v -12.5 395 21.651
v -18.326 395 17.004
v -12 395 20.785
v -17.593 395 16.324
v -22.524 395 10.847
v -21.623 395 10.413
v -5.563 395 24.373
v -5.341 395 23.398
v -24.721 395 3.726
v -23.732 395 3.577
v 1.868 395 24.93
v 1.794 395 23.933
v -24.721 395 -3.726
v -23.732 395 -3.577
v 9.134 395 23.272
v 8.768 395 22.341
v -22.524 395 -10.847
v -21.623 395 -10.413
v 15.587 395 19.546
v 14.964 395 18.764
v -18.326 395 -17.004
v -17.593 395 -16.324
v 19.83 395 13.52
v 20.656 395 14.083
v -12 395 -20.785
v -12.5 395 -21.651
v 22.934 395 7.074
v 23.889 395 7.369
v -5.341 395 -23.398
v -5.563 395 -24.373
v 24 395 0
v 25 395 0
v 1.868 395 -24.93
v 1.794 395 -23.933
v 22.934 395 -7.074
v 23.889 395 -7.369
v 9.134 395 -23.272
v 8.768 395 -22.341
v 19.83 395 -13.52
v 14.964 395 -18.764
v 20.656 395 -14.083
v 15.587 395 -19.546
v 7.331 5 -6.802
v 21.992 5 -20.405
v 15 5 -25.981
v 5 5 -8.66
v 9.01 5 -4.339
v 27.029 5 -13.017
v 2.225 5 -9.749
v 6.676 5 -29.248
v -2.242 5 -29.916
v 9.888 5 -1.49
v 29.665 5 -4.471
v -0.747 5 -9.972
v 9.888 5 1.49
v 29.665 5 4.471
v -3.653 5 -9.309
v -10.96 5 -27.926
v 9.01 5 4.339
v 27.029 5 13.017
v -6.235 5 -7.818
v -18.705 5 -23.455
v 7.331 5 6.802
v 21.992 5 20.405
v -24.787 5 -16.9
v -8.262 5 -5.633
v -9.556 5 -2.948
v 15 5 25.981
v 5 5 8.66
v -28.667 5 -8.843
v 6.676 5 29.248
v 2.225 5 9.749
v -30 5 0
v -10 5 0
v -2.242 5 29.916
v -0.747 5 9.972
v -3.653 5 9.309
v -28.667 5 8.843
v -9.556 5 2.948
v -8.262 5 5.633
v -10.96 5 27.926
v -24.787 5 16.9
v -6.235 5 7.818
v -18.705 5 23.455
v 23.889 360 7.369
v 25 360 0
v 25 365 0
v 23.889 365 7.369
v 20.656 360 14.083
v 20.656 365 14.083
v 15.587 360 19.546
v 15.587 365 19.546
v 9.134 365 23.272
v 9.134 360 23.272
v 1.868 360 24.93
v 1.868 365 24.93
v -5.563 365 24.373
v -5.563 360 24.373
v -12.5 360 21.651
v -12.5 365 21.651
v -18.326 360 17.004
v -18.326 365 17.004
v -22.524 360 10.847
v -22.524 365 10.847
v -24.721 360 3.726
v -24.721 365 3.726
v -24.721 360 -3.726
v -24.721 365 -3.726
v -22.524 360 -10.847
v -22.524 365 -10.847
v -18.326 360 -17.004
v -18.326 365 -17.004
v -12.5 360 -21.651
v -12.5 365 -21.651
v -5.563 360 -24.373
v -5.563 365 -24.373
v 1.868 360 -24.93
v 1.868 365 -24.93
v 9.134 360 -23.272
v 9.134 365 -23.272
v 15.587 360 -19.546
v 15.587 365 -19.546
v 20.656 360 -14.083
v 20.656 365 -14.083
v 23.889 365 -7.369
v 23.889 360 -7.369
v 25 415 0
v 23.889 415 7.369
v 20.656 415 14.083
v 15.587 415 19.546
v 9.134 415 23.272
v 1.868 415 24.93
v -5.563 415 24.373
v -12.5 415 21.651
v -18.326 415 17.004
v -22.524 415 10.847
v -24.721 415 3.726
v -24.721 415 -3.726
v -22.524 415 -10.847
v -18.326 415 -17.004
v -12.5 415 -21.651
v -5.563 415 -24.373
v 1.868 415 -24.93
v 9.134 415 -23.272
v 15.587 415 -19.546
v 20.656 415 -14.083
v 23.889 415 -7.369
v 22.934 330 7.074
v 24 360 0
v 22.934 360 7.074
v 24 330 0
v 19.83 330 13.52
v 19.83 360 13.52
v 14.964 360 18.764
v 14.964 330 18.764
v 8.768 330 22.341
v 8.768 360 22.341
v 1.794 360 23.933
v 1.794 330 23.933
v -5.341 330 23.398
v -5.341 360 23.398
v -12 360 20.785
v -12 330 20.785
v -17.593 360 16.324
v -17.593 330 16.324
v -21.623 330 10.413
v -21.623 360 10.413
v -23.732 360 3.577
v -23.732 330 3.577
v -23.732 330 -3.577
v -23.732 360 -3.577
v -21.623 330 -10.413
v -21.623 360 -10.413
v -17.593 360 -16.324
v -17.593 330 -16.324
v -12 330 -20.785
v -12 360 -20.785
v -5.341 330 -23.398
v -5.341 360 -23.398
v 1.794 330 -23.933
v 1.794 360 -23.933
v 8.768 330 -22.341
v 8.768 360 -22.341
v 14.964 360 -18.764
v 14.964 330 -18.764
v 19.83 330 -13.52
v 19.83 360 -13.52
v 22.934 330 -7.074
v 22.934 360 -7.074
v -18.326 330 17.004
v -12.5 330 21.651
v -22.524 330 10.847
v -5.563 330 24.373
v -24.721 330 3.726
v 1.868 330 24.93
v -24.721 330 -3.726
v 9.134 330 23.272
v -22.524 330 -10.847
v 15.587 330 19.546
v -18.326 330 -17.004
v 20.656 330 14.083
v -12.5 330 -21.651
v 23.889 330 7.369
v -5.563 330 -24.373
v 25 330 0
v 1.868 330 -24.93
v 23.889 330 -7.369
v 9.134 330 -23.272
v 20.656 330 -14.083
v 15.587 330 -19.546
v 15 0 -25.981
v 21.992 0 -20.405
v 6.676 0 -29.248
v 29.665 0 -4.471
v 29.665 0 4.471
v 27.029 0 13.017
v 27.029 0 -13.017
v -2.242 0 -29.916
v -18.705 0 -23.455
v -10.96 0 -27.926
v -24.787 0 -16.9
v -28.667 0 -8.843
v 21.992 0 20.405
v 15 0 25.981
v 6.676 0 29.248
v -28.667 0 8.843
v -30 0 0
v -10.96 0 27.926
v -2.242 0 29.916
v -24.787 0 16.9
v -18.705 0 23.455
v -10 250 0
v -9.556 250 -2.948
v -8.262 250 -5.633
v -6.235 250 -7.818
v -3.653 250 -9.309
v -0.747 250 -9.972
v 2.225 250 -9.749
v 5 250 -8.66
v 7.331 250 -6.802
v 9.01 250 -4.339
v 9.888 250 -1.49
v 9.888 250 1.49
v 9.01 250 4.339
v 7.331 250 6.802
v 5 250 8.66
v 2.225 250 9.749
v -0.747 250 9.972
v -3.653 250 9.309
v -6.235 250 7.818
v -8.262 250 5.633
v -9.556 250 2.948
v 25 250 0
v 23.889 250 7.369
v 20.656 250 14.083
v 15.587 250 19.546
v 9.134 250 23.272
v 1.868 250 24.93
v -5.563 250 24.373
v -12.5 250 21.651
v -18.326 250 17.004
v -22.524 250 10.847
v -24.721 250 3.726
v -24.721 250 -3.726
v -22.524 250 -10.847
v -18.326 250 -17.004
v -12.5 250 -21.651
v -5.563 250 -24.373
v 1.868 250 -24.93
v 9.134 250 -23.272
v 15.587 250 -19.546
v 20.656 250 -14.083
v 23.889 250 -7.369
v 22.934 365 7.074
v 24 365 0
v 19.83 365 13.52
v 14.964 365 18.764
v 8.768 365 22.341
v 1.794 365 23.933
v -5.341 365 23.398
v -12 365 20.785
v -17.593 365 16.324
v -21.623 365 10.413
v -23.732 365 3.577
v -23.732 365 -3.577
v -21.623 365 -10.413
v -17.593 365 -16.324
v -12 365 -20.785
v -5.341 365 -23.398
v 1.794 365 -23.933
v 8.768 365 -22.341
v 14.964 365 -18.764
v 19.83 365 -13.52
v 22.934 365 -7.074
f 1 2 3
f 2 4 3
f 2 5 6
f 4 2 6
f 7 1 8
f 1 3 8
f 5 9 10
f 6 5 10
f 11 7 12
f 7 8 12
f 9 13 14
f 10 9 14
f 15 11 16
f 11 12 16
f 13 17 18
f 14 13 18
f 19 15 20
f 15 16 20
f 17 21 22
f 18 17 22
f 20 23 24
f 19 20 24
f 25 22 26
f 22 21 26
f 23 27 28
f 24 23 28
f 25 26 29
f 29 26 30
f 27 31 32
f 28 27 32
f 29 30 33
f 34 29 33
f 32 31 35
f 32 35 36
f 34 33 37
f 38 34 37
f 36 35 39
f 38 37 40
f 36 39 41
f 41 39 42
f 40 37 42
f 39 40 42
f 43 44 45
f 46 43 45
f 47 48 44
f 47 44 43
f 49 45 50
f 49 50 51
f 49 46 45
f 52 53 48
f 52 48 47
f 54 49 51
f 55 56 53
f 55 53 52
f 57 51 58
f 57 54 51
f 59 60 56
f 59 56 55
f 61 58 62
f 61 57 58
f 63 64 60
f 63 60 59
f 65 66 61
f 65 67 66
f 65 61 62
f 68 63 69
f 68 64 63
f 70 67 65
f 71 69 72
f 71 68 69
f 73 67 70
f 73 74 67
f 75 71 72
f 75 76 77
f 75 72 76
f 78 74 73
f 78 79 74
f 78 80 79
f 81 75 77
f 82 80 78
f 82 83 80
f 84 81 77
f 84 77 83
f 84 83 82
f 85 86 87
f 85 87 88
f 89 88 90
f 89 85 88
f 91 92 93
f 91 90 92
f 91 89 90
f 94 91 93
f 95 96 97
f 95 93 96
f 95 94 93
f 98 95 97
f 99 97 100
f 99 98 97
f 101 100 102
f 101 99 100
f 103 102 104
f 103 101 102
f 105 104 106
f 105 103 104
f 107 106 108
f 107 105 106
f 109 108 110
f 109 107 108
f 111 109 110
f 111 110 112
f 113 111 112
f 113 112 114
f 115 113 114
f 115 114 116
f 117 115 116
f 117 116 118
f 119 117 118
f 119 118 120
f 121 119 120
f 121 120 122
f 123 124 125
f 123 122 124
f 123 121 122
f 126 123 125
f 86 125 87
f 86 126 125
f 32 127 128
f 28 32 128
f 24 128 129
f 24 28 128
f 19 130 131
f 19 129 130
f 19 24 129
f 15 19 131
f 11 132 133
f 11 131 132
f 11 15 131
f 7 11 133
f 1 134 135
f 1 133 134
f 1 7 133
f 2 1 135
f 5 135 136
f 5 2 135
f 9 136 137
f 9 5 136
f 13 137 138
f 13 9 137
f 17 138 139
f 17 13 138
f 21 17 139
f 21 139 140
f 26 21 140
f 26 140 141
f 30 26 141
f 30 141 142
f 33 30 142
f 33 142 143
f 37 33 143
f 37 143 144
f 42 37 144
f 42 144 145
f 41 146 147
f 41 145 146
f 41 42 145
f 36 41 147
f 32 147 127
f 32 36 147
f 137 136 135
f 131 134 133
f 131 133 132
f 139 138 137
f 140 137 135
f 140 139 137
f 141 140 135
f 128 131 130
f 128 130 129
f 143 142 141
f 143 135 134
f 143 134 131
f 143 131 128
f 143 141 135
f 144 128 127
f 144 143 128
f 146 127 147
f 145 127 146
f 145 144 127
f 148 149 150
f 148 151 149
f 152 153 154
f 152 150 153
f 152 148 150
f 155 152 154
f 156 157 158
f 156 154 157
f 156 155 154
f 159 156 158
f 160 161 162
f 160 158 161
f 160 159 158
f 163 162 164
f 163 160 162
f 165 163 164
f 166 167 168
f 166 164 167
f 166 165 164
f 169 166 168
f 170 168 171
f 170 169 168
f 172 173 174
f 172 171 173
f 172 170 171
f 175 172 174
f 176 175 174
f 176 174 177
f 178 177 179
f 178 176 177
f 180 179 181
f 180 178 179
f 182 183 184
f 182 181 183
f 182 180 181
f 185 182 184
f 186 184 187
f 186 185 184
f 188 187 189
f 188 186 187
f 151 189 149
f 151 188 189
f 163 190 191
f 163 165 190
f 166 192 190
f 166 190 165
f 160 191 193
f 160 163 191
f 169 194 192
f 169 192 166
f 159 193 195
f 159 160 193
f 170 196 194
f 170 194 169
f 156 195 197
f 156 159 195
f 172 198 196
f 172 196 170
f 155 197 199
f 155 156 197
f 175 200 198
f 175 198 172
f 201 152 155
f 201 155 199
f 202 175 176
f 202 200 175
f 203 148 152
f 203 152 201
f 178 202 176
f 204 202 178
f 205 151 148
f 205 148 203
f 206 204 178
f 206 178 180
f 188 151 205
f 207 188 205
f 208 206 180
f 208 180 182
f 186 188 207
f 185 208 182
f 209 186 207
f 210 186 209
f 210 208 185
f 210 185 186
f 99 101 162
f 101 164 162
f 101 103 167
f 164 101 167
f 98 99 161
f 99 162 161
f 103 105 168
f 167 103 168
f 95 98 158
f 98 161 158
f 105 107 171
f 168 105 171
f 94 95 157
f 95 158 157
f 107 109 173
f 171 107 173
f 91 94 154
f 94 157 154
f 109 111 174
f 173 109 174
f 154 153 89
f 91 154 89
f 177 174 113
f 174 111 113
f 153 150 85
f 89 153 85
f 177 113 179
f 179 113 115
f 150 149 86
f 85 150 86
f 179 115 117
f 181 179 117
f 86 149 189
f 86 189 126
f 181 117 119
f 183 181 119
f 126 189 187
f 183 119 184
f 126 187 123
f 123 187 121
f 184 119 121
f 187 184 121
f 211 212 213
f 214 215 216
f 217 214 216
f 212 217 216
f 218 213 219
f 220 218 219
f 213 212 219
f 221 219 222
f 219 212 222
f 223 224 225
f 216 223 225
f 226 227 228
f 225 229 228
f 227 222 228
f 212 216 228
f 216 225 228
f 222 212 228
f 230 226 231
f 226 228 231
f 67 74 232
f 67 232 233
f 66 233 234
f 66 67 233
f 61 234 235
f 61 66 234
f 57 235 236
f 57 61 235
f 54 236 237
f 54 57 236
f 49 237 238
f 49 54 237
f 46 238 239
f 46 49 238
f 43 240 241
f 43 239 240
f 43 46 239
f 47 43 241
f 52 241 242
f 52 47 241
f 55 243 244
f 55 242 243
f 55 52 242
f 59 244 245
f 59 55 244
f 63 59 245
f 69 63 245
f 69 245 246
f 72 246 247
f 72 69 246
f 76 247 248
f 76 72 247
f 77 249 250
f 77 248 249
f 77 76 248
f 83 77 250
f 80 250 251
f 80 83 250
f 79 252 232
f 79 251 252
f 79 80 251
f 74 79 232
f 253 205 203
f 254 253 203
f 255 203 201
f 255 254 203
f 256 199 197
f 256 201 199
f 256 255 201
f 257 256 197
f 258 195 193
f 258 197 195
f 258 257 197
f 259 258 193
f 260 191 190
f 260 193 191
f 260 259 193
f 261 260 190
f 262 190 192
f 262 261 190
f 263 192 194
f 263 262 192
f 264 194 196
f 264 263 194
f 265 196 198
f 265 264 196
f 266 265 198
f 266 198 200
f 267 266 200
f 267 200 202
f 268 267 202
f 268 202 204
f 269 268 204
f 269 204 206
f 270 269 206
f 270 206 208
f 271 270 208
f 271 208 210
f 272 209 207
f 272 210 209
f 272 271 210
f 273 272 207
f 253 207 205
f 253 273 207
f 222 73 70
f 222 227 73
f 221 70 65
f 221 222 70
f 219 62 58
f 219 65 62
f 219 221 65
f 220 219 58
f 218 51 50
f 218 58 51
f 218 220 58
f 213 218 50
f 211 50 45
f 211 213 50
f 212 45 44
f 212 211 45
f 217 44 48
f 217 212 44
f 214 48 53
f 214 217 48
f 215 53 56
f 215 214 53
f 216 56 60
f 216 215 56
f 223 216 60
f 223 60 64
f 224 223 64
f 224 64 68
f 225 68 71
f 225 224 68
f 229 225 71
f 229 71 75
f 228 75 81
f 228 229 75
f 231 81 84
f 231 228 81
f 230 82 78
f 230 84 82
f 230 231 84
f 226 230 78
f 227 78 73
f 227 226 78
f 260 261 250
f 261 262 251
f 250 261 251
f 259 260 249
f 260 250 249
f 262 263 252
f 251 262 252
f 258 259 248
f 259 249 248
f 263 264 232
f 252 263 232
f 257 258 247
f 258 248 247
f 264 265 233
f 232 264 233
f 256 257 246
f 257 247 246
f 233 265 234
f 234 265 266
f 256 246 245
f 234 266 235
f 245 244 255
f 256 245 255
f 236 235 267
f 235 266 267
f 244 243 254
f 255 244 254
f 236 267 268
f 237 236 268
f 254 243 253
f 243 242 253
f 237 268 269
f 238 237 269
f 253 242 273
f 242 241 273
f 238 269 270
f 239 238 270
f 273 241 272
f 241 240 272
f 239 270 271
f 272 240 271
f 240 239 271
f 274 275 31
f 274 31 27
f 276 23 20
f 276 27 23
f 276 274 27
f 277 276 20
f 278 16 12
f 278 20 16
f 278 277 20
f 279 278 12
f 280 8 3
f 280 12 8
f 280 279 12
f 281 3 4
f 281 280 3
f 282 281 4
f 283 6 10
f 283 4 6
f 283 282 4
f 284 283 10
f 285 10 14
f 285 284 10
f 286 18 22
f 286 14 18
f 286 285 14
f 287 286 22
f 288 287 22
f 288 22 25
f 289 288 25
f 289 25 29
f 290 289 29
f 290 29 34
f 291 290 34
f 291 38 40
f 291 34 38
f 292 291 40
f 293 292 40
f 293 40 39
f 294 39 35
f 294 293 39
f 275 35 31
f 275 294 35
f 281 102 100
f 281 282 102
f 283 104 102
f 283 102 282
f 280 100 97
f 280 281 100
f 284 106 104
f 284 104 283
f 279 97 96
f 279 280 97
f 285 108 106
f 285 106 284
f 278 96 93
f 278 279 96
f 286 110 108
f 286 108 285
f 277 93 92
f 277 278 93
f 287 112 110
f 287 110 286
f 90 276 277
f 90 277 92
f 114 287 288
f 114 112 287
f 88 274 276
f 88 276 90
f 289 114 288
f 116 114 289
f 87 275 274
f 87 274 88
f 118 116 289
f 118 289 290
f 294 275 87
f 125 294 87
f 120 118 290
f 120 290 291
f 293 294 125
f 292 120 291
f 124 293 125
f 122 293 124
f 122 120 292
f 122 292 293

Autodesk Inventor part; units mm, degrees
ref_plane "YZ Plane" through (0, 0, 0) normal (1, 0, 0) x (0, 1, 0)
ref_plane "XZ Plane" through (0, 0, 0) normal (0, 1, 0) x (-1, 0, 0)
ref_plane "XY Plane" through (0, 0, 0) normal (0, 0, 1) x (1, 0, 0)
sketch "스케치1" plane through (0, 0, 0) normal (0, 1, 0) x (-1, 0, 0)
  circle A0 centre (0, 0) radius 30
  circle A1 centre (0, 0) radius 10
  dimension "d0" = 60
  dimension "d1" = 20
extrude "돌출1" add sketch "스케치1" along normal blind 5
extrude "돌출2" add sketch "스케치1" along normal blind 250 contours A1
sketch "스케치2" plane through (0, 250, 0) normal (0, 1, 0) x (1, 0, 0)
  circle A0 centre (0, 0) radius 25
  dimension "d6" = 50
extrude "돌출3" add sketch "스케치2" along normal blind 80
sketch "스케치6" plane through (0, 330, 0) normal (0, 1, 0) x (1, 0, 0)
  circle A0 centre (0, 0) radius 25 projected
  circle A1 centre (0, 0) radius 24
  dimension "d15" = 48
extrude "돌출6" add sketch "스케치6" along normal blind 30 contours A1
sketch "스케치7" plane through (0, 360, 0) normal (0, 1, 0) x (1, 0, 0)
  circle A0 centre (0, 0) radius 25
  dimension "d18" = 50
extrude "돌출7" add sketch "스케치7" along normal blind 5
sketch "스케치8" plane through (0, 365, 0) normal (0, 1, 0) x (1, 0, 0)
  circle A0 centre (0, 0) radius 24
  dimension "d21" = 48
extrude "돌출8" add sketch "스케치8" along normal blind 30
sketch "스케치9" plane through (0, 395, 0) normal (0, 1, 0) x (1, 0, 0)
  circle A0 centre (0, 0) radius 25
  dimension "d24" = 50
extrude "돌출9" add sketch "스케치9" along normal blind 20
properties part number "led"
